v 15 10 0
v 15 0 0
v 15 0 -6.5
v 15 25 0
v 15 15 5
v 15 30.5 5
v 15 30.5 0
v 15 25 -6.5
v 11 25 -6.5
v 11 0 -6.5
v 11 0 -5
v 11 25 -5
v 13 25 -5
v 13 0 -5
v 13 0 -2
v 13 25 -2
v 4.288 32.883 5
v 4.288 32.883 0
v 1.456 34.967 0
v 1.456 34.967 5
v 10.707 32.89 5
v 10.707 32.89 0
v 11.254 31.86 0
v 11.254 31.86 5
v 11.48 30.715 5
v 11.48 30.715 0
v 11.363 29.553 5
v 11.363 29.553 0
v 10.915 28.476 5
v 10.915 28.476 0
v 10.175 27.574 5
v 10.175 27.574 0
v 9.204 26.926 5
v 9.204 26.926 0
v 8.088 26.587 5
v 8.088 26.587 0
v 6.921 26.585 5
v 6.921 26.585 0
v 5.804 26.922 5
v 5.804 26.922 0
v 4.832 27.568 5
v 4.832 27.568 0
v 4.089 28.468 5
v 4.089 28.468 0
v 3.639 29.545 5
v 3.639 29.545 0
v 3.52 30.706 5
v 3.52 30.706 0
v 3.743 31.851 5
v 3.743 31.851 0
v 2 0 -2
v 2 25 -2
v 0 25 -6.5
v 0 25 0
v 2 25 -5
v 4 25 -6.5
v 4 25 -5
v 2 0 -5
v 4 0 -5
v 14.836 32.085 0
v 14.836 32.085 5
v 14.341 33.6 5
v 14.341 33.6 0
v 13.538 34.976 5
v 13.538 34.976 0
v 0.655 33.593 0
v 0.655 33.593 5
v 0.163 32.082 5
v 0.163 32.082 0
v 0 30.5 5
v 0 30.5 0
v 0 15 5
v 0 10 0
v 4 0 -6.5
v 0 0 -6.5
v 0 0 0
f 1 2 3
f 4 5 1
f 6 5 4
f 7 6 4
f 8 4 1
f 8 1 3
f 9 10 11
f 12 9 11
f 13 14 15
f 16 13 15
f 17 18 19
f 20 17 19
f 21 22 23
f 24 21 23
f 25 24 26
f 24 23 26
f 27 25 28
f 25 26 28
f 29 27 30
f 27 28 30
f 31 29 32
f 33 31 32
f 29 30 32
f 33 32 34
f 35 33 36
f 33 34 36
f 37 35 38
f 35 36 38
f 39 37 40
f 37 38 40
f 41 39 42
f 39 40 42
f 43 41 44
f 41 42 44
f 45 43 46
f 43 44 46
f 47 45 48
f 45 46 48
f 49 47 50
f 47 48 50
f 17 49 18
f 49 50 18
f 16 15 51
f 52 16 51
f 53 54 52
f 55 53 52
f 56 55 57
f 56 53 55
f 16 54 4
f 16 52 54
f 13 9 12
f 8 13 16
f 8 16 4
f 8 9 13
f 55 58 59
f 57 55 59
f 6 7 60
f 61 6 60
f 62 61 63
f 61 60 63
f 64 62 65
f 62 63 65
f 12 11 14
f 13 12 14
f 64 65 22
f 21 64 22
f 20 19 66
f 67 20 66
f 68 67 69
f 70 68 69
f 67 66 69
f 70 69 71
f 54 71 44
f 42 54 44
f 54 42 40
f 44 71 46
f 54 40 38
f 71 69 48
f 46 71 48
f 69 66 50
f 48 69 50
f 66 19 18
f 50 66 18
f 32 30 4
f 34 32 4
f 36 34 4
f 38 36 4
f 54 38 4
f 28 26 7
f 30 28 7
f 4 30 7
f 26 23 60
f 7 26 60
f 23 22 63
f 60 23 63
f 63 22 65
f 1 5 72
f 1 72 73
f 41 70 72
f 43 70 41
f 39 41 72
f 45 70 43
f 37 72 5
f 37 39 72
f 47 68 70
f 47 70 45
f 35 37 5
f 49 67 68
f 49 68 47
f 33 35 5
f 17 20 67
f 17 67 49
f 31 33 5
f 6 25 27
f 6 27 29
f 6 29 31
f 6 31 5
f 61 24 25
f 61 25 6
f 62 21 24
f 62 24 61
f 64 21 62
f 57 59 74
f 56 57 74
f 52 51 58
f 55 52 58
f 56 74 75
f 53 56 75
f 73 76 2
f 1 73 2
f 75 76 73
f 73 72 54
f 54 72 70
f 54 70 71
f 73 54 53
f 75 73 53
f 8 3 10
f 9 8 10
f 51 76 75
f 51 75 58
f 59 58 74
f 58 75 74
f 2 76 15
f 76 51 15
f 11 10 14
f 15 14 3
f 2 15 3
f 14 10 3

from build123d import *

# Parameters (mm, degrees)
BOSS_EXTRUDE2_DEPTH = 25
BOSS_EXTRUDE4_DEPTH = 5
BOSS_EXTRUDE5_DEPTH = 15


with BuildPart() as part:
    # Sketch1 → Boss-Extrude2 (new body)
    with BuildSketch(Plane(origin=(0, 0, 0), x_dir=(1, 0, 0), z_dir=(0, 1, 0))):
        Polygon((0, 0), (15, 0), (15, 6.5), (11, 6.5), (11, 5), (13, 5), (13, 2), (2, 2), (2, 5), (4, 5), (4, 6.5), (0, 6.5), align=None)
    extrude(amount=BOSS_EXTRUDE2_DEPTH)

    # Sketch3 → Boss-Extrude4 (add)
    with BuildSketch(Plane.XY):
        with BuildLine():
            Line((15, 25), (15, 28.291553618))
            Line((15, 28.291553618), (15, 30.5))
            ThreePointArc((15, 30.5), (14.62928544, 32.855859369), (13.53772985, 34.976238828))
            Line((13.53772985, 34.976238828), (10.707203961, 32.890364565))
            ThreePointArc((10.707203961, 32.890364565), (7.504387795, 26.542932427), (4.28759779, 32.883294263))
            Line((4.28759779, 32.883294263), (1.455694475, 34.967301819))
            ThreePointArc((1.455694475, 34.967301819), (0.3689938, 32.850585244), (0, 30.5))
            Line((0, 30.5), (0, 28.291553618))
            Line((0, 28.291553618), (0, 25))
            Line((0, 25), (0, 15))
            Line((0, 15), (15, 15))
            Line((15, 15), (15, 25))
        make_face()
    extrude(amount=BOSS_EXTRUDE4_DEPTH)

    # Sketch4 → Boss-Extrude5 (add)
    with BuildSketch(Plane(origin=(15, 0, 0), x_dir=(0, 0, -1), z_dir=(1, 0, 0))):
        Polygon((-5, 15), (0, 10), (0, 15), align=None)
    extrude(amount=-BOSS_EXTRUDE5_DEPTH)


solid = part.part
